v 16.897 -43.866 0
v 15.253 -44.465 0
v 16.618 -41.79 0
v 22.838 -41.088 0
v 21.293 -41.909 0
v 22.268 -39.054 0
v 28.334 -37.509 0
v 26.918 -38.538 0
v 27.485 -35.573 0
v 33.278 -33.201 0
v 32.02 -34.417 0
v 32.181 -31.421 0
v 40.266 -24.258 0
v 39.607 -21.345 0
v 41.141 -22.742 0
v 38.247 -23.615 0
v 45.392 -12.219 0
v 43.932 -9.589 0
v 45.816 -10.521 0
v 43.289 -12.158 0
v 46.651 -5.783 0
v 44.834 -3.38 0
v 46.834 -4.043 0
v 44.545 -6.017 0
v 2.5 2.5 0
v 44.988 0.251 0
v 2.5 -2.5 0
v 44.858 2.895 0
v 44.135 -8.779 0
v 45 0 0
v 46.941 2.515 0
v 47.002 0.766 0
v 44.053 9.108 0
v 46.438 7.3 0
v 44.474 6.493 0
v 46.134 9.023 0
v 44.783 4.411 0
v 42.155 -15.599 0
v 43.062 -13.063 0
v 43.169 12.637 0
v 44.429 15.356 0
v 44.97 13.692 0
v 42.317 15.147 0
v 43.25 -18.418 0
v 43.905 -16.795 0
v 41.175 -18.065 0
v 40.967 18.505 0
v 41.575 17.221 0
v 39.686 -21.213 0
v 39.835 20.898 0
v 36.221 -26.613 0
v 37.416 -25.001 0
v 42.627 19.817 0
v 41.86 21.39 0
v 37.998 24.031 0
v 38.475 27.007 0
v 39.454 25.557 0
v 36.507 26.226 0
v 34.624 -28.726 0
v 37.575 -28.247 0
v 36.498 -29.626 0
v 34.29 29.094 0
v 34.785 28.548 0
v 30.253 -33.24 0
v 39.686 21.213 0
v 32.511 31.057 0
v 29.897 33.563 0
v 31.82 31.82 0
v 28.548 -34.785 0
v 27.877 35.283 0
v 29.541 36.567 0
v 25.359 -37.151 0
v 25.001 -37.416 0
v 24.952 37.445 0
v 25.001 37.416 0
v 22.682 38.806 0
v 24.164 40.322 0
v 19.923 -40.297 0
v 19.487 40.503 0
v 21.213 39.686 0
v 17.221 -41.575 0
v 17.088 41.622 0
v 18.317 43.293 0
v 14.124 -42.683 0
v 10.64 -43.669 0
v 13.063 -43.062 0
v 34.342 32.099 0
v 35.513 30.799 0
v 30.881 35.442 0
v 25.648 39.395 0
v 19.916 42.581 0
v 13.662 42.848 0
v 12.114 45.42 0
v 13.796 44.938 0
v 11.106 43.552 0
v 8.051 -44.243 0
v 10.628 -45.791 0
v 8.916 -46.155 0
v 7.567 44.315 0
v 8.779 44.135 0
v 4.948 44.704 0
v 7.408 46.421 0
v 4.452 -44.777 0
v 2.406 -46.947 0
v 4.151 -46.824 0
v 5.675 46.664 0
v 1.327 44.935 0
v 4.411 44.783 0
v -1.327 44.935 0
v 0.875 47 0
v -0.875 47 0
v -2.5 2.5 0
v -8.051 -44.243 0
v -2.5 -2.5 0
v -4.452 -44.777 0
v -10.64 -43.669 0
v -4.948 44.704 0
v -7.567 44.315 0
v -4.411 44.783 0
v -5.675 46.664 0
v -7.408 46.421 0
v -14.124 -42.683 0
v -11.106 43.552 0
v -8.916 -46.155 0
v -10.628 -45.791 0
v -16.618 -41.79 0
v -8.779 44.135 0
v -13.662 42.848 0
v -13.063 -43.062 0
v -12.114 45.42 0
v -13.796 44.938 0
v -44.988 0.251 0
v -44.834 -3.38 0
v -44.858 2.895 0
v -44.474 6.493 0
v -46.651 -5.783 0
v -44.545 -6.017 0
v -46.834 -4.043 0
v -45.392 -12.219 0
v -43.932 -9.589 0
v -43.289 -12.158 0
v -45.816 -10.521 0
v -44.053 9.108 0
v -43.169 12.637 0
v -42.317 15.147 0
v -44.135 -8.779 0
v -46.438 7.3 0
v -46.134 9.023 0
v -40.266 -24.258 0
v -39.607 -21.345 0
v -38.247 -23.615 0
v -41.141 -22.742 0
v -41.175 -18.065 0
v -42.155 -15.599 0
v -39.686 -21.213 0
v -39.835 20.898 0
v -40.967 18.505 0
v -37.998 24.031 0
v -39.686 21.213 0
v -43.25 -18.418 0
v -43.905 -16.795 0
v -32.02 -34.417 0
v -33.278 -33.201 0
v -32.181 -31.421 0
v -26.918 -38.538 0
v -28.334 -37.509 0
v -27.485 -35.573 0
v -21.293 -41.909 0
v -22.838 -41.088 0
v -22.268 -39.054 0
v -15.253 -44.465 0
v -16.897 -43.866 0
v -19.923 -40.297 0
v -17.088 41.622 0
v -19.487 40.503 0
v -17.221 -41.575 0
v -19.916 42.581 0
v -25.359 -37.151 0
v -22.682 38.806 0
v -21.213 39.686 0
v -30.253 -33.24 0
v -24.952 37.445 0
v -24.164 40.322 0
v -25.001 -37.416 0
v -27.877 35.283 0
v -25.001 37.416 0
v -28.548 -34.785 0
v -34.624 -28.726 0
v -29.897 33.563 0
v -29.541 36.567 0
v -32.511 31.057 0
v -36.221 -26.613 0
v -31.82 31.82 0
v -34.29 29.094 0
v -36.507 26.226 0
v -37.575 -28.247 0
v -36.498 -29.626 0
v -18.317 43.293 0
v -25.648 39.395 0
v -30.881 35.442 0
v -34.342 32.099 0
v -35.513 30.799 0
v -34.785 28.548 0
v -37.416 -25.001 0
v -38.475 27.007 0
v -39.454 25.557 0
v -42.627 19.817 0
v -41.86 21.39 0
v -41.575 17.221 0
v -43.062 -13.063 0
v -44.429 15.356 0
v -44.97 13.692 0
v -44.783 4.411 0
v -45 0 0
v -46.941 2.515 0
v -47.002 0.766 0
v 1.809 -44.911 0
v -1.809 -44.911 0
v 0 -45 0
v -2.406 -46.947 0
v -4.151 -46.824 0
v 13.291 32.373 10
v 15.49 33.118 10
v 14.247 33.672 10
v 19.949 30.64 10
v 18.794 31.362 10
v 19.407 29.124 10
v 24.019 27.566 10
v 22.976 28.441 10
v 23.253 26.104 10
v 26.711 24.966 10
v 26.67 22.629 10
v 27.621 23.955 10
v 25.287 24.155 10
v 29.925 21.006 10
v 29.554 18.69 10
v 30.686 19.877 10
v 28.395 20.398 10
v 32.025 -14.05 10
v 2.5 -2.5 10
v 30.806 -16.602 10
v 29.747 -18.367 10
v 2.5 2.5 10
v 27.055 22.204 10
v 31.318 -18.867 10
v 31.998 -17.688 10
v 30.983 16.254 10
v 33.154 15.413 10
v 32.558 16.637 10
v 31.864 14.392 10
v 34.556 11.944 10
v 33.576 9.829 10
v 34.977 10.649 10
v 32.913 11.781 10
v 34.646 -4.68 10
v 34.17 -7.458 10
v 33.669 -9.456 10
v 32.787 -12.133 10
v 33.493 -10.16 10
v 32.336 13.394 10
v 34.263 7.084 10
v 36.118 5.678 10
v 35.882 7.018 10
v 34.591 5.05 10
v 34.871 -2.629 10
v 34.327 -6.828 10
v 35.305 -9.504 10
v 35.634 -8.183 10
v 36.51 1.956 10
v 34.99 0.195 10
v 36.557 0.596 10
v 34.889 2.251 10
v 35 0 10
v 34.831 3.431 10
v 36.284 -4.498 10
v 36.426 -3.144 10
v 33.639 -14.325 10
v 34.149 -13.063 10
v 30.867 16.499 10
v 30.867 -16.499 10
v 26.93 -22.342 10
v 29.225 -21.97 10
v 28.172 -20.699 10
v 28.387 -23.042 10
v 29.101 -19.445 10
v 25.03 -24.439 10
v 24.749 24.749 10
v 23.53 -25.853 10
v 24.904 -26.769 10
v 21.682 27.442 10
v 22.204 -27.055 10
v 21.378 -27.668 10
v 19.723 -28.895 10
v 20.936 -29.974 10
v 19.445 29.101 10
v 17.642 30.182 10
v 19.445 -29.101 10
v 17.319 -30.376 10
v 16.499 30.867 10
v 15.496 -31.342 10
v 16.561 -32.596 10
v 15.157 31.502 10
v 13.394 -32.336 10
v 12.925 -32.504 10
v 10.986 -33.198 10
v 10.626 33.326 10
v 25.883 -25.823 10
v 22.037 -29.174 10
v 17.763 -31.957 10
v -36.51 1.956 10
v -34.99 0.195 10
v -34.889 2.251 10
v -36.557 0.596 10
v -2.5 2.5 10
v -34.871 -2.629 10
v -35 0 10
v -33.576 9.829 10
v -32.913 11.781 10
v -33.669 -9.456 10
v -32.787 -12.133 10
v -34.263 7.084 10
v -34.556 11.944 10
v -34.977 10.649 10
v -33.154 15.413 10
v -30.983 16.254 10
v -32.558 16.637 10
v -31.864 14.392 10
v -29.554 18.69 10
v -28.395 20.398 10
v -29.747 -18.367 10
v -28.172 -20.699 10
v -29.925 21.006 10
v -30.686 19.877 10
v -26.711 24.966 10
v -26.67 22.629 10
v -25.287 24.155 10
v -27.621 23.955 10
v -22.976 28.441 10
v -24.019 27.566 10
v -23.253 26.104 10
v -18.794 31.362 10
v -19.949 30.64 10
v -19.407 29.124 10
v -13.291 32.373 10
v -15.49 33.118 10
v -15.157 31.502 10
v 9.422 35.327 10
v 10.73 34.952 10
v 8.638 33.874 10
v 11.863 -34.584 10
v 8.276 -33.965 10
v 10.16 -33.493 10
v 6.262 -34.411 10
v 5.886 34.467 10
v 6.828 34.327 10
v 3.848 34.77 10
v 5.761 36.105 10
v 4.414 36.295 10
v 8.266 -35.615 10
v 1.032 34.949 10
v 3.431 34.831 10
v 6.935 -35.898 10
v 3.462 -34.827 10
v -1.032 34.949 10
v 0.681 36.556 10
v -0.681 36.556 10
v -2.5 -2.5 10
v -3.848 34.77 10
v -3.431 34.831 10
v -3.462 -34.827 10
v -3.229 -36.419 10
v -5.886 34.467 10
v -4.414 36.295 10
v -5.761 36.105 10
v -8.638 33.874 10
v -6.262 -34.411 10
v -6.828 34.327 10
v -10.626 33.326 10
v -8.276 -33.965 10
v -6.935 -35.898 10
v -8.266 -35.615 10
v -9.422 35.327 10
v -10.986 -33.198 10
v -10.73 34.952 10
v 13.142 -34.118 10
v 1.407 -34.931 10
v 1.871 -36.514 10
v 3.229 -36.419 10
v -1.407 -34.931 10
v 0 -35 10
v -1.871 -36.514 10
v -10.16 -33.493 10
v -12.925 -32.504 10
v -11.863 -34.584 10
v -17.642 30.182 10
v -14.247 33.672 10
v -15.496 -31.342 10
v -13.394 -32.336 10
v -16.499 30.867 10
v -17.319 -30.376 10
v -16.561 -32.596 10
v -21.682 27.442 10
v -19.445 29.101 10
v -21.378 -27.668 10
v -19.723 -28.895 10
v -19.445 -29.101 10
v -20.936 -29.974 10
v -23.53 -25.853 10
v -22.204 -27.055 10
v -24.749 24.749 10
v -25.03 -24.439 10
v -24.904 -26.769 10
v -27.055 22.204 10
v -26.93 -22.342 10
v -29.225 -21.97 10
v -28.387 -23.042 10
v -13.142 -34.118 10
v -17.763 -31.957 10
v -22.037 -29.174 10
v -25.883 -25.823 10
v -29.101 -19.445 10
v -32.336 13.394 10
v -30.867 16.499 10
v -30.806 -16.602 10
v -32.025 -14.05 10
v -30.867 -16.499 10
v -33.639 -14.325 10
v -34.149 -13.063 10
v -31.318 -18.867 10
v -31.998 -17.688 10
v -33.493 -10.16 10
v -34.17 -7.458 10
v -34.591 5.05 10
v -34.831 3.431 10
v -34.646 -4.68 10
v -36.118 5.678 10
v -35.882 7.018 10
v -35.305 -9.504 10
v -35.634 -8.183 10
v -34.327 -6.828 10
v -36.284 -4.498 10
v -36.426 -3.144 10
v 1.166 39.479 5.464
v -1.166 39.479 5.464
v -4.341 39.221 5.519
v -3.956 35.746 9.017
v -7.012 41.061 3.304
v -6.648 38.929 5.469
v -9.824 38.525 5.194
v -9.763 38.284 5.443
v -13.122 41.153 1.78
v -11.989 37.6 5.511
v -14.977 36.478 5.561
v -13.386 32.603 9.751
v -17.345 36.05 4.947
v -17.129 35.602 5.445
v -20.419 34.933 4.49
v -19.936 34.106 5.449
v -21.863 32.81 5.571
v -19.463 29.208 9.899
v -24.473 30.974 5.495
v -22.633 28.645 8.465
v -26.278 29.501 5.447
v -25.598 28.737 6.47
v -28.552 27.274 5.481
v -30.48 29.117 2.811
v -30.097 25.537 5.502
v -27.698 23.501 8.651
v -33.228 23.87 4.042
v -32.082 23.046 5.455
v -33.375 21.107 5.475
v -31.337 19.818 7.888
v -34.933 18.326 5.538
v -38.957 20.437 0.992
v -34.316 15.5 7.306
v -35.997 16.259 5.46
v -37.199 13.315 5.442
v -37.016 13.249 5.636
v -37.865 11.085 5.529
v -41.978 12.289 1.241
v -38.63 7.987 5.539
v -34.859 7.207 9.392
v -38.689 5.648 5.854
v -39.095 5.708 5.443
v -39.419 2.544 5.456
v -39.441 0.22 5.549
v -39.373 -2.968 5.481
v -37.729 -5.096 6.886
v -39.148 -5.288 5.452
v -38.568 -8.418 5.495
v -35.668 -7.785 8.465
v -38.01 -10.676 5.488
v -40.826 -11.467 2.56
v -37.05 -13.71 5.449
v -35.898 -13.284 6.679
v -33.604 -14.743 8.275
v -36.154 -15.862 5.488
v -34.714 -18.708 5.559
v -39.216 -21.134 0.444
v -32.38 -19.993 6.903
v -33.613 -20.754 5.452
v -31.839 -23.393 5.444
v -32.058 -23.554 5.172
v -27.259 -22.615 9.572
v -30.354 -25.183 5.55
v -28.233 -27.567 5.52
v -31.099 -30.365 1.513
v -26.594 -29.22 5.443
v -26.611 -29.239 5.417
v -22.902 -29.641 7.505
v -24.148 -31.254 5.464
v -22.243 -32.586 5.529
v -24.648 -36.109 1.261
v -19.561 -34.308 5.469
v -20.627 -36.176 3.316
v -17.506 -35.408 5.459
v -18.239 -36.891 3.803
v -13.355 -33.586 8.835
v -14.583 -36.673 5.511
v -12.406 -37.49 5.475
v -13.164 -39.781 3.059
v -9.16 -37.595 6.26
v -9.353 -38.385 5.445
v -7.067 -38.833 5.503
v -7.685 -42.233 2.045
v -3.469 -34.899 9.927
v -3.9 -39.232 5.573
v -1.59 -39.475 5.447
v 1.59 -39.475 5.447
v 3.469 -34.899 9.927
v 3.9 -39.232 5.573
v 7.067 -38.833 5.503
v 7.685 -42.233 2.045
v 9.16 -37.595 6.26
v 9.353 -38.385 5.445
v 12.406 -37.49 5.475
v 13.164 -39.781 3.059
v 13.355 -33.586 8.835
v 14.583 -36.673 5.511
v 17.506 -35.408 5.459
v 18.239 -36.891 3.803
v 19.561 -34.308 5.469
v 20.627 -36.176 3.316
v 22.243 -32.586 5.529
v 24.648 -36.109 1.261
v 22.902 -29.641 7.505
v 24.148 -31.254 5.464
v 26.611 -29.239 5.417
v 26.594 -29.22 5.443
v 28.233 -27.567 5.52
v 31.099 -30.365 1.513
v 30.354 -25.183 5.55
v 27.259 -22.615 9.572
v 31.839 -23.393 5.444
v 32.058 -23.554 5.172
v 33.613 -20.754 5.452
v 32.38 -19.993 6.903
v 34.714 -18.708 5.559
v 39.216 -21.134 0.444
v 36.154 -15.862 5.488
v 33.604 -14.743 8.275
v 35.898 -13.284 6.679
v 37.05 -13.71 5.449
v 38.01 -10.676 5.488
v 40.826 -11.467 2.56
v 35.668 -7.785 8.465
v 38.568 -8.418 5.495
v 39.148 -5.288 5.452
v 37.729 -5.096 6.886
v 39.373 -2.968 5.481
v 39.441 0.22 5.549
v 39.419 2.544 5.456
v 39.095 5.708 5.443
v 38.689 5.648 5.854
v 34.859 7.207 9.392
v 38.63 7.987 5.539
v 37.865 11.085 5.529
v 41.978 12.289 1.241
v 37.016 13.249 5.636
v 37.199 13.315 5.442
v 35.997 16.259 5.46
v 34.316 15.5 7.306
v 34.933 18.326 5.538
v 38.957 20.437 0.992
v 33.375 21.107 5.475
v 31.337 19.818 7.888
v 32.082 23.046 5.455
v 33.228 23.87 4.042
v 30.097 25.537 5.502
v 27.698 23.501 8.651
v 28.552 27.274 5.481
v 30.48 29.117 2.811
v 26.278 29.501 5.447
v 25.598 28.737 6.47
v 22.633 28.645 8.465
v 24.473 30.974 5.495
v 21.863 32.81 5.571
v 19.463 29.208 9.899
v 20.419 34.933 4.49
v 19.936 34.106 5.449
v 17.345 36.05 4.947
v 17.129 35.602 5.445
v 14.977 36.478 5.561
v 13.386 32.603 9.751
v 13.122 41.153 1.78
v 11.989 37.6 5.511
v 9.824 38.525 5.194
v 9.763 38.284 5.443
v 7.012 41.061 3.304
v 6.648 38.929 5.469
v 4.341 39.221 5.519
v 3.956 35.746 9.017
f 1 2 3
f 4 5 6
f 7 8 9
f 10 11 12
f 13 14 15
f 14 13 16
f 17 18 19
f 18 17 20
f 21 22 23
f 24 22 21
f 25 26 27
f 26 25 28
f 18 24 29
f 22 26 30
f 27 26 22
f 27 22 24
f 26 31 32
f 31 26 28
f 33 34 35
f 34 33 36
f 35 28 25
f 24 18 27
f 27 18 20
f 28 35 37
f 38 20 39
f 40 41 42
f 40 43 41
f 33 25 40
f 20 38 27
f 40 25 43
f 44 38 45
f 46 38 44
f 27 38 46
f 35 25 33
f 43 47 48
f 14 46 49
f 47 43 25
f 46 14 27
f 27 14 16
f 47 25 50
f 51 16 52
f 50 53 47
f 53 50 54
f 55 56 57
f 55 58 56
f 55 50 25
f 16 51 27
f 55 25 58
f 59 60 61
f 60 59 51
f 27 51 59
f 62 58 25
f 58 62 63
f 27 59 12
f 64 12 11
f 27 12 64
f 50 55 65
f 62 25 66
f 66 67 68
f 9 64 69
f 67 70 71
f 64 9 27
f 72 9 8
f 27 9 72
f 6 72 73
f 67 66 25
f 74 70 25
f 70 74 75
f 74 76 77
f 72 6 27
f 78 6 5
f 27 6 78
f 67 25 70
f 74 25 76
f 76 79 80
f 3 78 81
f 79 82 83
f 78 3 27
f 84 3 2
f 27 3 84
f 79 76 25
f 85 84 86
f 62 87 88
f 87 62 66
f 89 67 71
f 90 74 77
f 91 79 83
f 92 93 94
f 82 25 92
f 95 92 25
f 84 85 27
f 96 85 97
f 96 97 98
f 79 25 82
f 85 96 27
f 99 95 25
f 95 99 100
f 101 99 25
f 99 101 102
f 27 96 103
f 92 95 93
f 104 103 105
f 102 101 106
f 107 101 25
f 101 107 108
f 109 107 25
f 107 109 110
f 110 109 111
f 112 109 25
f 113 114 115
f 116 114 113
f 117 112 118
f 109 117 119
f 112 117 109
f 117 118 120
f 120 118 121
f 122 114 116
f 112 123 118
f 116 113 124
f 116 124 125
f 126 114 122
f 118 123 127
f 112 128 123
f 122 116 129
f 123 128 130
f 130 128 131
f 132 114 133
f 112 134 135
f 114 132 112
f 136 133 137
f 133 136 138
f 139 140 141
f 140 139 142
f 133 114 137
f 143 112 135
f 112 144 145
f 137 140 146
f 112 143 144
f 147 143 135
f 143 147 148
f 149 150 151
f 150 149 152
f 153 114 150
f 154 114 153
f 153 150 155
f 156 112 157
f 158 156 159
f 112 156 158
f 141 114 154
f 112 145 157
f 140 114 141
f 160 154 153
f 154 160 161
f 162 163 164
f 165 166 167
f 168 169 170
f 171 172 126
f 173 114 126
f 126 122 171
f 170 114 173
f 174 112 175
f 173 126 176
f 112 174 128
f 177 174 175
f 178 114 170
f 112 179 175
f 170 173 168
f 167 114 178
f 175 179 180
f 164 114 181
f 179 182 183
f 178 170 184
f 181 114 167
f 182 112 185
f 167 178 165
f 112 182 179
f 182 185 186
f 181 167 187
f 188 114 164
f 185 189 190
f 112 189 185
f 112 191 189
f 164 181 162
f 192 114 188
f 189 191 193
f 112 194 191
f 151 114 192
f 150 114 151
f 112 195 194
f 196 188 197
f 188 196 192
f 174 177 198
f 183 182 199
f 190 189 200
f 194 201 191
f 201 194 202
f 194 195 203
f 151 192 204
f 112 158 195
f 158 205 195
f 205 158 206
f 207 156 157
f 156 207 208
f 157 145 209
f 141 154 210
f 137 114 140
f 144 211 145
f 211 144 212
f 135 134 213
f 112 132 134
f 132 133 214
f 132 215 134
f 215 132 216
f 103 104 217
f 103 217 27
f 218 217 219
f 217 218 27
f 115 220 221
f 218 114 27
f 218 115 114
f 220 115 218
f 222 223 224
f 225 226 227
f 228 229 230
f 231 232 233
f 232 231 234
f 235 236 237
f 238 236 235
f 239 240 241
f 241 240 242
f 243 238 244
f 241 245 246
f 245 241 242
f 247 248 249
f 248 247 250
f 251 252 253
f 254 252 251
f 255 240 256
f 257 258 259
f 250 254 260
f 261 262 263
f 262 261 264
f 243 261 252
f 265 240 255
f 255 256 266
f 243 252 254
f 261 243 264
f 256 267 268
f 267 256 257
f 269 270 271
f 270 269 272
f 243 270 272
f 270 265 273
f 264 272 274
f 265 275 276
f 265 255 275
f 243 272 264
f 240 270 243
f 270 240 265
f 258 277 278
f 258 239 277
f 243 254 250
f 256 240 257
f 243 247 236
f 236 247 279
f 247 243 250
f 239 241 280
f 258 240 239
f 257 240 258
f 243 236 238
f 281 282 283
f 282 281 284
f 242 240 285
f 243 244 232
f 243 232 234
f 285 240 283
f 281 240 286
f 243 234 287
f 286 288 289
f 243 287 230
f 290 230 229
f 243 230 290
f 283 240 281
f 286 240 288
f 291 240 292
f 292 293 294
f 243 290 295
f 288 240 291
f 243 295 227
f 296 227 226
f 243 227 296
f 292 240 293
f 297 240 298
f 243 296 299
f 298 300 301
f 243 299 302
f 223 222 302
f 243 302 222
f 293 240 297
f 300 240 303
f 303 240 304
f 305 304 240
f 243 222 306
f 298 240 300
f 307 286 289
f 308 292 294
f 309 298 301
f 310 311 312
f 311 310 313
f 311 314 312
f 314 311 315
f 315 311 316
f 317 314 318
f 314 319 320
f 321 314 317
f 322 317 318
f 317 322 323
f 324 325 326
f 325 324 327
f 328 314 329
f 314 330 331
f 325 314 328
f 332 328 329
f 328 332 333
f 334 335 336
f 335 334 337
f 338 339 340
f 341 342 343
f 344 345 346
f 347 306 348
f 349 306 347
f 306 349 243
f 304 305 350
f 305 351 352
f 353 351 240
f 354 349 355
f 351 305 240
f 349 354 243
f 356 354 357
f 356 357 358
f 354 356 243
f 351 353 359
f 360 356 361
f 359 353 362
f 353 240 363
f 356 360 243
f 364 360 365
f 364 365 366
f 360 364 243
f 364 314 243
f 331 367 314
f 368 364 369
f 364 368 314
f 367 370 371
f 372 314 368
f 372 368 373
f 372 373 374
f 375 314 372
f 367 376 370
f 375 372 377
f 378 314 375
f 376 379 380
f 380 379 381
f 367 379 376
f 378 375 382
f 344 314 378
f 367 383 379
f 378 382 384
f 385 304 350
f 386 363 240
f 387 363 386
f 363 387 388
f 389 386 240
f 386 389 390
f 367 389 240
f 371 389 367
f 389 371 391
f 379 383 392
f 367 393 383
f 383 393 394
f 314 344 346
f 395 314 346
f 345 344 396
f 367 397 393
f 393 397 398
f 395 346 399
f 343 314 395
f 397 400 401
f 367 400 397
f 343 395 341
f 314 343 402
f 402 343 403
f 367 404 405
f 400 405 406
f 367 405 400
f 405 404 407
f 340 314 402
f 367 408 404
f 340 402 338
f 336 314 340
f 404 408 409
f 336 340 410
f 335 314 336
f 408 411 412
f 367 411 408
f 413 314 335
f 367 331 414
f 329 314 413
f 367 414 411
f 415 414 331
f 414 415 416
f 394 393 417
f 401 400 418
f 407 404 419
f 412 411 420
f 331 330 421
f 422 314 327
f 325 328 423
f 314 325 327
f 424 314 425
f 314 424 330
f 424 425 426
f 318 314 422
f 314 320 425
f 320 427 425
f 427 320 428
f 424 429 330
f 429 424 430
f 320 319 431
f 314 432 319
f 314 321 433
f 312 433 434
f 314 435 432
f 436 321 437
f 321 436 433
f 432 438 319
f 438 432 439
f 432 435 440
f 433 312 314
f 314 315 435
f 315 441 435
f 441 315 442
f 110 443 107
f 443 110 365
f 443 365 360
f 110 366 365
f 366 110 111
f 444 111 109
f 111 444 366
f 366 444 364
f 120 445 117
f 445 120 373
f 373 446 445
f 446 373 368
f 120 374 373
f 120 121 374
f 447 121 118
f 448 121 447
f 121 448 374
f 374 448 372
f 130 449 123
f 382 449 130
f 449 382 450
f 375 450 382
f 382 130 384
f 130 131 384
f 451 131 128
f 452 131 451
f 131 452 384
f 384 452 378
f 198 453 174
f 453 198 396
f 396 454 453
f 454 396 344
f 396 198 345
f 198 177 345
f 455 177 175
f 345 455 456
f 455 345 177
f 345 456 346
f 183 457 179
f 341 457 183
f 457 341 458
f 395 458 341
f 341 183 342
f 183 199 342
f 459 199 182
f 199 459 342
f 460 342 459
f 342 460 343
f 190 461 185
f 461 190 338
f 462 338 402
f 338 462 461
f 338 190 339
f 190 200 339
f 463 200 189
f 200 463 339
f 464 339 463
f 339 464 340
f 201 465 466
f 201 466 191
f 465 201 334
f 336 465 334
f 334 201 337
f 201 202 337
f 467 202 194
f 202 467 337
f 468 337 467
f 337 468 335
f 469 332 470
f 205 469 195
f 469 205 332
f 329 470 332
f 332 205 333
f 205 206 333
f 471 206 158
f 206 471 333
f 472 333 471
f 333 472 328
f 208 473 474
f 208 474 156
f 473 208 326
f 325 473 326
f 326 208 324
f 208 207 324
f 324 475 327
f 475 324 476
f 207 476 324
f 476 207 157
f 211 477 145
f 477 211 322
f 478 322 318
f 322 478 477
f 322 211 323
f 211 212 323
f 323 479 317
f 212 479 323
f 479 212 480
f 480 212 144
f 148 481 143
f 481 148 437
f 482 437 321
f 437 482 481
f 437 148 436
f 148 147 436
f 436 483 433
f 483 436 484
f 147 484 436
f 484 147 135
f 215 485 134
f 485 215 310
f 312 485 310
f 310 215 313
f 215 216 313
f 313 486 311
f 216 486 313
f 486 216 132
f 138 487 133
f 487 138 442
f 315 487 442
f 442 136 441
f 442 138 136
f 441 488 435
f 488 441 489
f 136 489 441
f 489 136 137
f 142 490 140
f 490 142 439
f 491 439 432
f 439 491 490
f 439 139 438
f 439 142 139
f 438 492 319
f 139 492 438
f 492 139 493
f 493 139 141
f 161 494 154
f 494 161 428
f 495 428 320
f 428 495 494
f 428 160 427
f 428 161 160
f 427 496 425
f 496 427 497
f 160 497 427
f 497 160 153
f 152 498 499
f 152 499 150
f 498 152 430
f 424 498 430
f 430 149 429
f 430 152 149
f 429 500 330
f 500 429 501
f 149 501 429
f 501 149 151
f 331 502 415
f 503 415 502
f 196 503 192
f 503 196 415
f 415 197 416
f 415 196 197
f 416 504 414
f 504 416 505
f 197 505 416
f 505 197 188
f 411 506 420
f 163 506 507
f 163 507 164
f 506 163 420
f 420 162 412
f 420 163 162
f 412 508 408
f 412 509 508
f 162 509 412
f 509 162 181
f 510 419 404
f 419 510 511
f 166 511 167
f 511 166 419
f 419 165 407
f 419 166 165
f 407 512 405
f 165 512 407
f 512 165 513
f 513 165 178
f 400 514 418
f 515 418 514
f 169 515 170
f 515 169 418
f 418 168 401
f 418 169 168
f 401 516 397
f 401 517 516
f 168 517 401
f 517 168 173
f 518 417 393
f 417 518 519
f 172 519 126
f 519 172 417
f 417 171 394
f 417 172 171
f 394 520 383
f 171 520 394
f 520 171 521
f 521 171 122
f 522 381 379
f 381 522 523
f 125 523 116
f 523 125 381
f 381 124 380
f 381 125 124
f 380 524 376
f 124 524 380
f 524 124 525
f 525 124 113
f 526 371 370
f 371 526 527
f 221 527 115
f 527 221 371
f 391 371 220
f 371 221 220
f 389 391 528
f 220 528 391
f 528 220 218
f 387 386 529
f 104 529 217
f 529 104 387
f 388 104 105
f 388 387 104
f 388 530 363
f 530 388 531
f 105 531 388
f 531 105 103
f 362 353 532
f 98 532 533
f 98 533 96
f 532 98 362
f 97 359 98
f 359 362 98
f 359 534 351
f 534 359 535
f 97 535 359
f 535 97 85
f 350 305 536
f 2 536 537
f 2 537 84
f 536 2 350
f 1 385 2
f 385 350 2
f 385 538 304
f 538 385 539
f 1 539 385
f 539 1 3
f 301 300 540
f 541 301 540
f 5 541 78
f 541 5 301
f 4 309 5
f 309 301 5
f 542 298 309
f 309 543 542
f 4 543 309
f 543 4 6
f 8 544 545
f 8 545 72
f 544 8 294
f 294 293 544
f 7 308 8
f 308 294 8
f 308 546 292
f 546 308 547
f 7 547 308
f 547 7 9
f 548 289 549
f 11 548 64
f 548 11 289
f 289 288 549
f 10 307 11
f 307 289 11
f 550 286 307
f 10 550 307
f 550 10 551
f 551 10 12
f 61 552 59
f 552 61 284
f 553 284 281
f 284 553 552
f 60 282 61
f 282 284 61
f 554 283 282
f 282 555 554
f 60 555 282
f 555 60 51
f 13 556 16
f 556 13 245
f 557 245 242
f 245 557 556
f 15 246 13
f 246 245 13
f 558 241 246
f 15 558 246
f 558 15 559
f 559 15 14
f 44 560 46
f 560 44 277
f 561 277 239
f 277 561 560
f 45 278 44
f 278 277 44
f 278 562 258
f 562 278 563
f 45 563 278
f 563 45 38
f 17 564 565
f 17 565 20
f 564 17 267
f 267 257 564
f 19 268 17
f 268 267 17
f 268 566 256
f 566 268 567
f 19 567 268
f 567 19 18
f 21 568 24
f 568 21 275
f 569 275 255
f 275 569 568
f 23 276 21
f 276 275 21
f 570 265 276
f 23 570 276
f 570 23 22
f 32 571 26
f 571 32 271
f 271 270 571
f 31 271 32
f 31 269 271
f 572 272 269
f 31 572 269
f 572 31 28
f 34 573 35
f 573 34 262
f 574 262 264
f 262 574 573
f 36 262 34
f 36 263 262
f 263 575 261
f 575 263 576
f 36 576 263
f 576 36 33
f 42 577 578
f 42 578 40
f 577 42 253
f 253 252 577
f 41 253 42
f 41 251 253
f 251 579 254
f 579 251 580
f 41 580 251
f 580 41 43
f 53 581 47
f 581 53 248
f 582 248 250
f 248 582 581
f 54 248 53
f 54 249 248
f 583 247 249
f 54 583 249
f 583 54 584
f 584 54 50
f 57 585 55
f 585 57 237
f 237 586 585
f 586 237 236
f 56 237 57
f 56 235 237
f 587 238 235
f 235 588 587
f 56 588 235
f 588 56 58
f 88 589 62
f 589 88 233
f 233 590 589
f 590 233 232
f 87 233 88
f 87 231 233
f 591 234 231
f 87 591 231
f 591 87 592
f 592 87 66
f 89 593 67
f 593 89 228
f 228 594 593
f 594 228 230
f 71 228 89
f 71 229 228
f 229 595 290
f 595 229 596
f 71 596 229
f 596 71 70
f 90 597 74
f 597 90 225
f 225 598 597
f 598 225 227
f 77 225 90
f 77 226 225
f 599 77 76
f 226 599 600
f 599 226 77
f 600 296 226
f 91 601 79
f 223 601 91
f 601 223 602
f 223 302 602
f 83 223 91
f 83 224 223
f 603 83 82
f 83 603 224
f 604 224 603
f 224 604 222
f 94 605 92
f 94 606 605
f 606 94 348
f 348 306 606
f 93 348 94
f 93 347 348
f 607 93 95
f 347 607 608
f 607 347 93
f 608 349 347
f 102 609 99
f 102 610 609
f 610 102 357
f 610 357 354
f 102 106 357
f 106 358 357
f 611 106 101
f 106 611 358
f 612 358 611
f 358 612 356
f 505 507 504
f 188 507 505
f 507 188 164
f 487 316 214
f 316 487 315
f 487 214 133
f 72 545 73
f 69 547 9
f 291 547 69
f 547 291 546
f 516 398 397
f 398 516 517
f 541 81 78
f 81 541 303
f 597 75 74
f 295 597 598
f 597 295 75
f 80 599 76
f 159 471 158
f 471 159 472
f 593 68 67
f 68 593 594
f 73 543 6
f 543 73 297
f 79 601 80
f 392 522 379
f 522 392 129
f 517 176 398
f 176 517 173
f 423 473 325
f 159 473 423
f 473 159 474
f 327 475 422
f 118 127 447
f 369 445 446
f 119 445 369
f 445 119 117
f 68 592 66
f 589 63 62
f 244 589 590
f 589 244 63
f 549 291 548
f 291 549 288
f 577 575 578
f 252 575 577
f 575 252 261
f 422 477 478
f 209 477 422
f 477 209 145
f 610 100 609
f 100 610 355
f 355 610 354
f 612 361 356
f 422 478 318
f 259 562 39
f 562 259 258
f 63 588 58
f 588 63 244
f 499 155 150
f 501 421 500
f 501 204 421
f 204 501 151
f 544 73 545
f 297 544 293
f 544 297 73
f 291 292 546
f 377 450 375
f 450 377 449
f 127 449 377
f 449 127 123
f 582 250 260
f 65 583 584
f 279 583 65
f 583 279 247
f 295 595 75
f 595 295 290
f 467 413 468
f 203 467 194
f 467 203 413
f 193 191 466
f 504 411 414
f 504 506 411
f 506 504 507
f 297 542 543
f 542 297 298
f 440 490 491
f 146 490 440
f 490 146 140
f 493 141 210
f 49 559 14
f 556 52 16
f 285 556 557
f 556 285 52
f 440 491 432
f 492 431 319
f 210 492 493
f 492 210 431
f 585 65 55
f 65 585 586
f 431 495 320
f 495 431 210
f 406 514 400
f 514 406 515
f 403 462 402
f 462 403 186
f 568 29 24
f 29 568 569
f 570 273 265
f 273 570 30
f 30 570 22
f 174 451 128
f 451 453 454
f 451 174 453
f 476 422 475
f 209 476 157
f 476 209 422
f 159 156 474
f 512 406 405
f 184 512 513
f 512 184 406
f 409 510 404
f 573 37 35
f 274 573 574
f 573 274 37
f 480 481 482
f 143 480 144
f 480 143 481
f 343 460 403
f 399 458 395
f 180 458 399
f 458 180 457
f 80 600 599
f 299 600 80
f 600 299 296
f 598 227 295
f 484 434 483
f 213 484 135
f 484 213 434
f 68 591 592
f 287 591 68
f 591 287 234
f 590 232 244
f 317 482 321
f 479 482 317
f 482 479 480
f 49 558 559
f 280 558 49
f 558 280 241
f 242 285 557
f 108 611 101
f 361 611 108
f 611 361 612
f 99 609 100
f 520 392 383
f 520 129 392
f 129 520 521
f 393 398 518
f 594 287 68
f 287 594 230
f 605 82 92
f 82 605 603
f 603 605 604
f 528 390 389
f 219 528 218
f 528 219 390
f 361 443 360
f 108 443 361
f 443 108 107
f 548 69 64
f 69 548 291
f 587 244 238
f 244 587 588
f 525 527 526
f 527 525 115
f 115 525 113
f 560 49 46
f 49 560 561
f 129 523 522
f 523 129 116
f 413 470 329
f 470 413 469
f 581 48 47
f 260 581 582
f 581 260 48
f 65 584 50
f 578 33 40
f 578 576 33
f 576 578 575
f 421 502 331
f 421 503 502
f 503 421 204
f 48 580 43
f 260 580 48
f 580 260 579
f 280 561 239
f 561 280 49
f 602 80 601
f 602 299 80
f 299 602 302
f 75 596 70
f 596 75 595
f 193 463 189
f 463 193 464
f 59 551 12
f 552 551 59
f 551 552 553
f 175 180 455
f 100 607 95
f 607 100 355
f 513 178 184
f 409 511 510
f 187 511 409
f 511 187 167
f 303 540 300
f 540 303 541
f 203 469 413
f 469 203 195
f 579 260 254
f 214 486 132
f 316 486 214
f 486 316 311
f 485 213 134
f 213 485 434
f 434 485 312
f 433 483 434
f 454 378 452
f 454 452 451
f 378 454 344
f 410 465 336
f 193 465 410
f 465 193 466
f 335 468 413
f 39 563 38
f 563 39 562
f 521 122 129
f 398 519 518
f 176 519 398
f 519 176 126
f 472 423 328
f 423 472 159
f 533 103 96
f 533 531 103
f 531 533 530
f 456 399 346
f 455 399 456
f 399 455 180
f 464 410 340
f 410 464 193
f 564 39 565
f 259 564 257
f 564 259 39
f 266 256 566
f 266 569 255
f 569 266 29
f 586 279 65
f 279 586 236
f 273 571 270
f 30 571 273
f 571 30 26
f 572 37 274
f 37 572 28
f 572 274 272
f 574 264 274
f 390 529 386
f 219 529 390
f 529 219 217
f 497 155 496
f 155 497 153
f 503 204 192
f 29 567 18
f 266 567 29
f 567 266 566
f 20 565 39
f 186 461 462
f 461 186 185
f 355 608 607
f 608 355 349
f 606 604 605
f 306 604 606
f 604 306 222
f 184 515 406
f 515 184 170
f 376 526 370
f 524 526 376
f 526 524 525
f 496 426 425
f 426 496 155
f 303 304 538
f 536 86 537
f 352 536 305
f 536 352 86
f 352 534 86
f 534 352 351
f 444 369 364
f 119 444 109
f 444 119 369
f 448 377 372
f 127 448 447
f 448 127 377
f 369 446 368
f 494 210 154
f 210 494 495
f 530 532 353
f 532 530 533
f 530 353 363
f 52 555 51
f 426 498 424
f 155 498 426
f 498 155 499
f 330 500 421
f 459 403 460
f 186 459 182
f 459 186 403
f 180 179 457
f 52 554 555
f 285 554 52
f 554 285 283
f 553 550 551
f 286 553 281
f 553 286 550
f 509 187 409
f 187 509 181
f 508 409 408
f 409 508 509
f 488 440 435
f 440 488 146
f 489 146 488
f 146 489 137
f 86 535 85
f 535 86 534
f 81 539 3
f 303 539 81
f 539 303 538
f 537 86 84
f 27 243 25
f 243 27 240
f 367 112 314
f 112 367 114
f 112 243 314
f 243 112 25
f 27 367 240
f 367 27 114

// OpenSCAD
// --- PARAMETRY KONFIGURACYJNE ---
n_teeth = 45;          // Liczba zębów
m_val = 2;             // Moduł
cone_angle = 45;       // Kąt stożka
face_width = 10;       // Szerokość wieńca
bore_side = 5;         // Bok kwadratowego otworu
tooth_width = 3.5;     // Szerokość zęba u podstawy

// --- OBLICZENIA POMOCNICZE ---
pitch_radius = (n_teeth * m_val) / 2;
top_reduction = face_width * tan(cone_angle);
inner_radius = pitch_radius - top_reduction;

// Wykonanie modelu
bevel_gear();

module bevel_gear() {
    difference() {
        union() {
            // Korpus główny
            cylinder(h = face_width, r1 = pitch_radius, r2 = inner_radius, $fn=64);

            // Generowanie zębów w pętli - POPRAWIONE n_teeth
            for (i = [0 : n_teeth - 1]) {
                rotate([0, 0, i * 360 / n_teeth])
                tooth();
            }
        }
        
        // Wycięcie kwadratowego otworu
        translate([0, 0, face_width / 2])
        cube([bore_side, bore_side, face_width + 2], center = true);
    }
}

module tooth() {
    h_val = m_val; 
    scale_f = inner_radius / pitch_radius;

    pts = [
        // Podstawa zęba (Z=0)
        [-tooth_width/2, pitch_radius - h_val, 0],           // 0
        [ tooth_width/2, pitch_radius - h_val, 0],           // 1
        [ tooth_width/4, pitch_radius + h_val, 0],           // 2
        [-tooth_width/4, pitch_radius + h_val, 0],           // 3
        
        // Wierzchołek zęba (Z=face_width)
        [-tooth_width/2 * scale_f, inner_radius - h_val * scale_f, face_width], // 4
        [ tooth_width/2 * scale_f, inner_radius - h_val * scale_f, face_width], // 5
        [ tooth_width/4 * scale_f, inner_radius + h_val * scale_f, face_width], // 6
        [-tooth_width/4 * scale_f, inner_radius + h_val * scale_f, face_width]  // 7
    ];

    // POPRAWIONA KOLEJNOŚĆ WIERZCHOŁKÓW (zamyka bryłę)
    faces = [
        [3, 2, 1, 0],  // dół
        [4, 5, 6, 7],  // góra
        [0, 1, 5, 4],  // tył
        [1, 2, 6, 5],  // bok prawy
        [2, 3, 7, 6],  // przód
        [3, 0, 4, 7]   // bok lewy
    ];

    polyhedron(points = pts, faces = faces);
}
